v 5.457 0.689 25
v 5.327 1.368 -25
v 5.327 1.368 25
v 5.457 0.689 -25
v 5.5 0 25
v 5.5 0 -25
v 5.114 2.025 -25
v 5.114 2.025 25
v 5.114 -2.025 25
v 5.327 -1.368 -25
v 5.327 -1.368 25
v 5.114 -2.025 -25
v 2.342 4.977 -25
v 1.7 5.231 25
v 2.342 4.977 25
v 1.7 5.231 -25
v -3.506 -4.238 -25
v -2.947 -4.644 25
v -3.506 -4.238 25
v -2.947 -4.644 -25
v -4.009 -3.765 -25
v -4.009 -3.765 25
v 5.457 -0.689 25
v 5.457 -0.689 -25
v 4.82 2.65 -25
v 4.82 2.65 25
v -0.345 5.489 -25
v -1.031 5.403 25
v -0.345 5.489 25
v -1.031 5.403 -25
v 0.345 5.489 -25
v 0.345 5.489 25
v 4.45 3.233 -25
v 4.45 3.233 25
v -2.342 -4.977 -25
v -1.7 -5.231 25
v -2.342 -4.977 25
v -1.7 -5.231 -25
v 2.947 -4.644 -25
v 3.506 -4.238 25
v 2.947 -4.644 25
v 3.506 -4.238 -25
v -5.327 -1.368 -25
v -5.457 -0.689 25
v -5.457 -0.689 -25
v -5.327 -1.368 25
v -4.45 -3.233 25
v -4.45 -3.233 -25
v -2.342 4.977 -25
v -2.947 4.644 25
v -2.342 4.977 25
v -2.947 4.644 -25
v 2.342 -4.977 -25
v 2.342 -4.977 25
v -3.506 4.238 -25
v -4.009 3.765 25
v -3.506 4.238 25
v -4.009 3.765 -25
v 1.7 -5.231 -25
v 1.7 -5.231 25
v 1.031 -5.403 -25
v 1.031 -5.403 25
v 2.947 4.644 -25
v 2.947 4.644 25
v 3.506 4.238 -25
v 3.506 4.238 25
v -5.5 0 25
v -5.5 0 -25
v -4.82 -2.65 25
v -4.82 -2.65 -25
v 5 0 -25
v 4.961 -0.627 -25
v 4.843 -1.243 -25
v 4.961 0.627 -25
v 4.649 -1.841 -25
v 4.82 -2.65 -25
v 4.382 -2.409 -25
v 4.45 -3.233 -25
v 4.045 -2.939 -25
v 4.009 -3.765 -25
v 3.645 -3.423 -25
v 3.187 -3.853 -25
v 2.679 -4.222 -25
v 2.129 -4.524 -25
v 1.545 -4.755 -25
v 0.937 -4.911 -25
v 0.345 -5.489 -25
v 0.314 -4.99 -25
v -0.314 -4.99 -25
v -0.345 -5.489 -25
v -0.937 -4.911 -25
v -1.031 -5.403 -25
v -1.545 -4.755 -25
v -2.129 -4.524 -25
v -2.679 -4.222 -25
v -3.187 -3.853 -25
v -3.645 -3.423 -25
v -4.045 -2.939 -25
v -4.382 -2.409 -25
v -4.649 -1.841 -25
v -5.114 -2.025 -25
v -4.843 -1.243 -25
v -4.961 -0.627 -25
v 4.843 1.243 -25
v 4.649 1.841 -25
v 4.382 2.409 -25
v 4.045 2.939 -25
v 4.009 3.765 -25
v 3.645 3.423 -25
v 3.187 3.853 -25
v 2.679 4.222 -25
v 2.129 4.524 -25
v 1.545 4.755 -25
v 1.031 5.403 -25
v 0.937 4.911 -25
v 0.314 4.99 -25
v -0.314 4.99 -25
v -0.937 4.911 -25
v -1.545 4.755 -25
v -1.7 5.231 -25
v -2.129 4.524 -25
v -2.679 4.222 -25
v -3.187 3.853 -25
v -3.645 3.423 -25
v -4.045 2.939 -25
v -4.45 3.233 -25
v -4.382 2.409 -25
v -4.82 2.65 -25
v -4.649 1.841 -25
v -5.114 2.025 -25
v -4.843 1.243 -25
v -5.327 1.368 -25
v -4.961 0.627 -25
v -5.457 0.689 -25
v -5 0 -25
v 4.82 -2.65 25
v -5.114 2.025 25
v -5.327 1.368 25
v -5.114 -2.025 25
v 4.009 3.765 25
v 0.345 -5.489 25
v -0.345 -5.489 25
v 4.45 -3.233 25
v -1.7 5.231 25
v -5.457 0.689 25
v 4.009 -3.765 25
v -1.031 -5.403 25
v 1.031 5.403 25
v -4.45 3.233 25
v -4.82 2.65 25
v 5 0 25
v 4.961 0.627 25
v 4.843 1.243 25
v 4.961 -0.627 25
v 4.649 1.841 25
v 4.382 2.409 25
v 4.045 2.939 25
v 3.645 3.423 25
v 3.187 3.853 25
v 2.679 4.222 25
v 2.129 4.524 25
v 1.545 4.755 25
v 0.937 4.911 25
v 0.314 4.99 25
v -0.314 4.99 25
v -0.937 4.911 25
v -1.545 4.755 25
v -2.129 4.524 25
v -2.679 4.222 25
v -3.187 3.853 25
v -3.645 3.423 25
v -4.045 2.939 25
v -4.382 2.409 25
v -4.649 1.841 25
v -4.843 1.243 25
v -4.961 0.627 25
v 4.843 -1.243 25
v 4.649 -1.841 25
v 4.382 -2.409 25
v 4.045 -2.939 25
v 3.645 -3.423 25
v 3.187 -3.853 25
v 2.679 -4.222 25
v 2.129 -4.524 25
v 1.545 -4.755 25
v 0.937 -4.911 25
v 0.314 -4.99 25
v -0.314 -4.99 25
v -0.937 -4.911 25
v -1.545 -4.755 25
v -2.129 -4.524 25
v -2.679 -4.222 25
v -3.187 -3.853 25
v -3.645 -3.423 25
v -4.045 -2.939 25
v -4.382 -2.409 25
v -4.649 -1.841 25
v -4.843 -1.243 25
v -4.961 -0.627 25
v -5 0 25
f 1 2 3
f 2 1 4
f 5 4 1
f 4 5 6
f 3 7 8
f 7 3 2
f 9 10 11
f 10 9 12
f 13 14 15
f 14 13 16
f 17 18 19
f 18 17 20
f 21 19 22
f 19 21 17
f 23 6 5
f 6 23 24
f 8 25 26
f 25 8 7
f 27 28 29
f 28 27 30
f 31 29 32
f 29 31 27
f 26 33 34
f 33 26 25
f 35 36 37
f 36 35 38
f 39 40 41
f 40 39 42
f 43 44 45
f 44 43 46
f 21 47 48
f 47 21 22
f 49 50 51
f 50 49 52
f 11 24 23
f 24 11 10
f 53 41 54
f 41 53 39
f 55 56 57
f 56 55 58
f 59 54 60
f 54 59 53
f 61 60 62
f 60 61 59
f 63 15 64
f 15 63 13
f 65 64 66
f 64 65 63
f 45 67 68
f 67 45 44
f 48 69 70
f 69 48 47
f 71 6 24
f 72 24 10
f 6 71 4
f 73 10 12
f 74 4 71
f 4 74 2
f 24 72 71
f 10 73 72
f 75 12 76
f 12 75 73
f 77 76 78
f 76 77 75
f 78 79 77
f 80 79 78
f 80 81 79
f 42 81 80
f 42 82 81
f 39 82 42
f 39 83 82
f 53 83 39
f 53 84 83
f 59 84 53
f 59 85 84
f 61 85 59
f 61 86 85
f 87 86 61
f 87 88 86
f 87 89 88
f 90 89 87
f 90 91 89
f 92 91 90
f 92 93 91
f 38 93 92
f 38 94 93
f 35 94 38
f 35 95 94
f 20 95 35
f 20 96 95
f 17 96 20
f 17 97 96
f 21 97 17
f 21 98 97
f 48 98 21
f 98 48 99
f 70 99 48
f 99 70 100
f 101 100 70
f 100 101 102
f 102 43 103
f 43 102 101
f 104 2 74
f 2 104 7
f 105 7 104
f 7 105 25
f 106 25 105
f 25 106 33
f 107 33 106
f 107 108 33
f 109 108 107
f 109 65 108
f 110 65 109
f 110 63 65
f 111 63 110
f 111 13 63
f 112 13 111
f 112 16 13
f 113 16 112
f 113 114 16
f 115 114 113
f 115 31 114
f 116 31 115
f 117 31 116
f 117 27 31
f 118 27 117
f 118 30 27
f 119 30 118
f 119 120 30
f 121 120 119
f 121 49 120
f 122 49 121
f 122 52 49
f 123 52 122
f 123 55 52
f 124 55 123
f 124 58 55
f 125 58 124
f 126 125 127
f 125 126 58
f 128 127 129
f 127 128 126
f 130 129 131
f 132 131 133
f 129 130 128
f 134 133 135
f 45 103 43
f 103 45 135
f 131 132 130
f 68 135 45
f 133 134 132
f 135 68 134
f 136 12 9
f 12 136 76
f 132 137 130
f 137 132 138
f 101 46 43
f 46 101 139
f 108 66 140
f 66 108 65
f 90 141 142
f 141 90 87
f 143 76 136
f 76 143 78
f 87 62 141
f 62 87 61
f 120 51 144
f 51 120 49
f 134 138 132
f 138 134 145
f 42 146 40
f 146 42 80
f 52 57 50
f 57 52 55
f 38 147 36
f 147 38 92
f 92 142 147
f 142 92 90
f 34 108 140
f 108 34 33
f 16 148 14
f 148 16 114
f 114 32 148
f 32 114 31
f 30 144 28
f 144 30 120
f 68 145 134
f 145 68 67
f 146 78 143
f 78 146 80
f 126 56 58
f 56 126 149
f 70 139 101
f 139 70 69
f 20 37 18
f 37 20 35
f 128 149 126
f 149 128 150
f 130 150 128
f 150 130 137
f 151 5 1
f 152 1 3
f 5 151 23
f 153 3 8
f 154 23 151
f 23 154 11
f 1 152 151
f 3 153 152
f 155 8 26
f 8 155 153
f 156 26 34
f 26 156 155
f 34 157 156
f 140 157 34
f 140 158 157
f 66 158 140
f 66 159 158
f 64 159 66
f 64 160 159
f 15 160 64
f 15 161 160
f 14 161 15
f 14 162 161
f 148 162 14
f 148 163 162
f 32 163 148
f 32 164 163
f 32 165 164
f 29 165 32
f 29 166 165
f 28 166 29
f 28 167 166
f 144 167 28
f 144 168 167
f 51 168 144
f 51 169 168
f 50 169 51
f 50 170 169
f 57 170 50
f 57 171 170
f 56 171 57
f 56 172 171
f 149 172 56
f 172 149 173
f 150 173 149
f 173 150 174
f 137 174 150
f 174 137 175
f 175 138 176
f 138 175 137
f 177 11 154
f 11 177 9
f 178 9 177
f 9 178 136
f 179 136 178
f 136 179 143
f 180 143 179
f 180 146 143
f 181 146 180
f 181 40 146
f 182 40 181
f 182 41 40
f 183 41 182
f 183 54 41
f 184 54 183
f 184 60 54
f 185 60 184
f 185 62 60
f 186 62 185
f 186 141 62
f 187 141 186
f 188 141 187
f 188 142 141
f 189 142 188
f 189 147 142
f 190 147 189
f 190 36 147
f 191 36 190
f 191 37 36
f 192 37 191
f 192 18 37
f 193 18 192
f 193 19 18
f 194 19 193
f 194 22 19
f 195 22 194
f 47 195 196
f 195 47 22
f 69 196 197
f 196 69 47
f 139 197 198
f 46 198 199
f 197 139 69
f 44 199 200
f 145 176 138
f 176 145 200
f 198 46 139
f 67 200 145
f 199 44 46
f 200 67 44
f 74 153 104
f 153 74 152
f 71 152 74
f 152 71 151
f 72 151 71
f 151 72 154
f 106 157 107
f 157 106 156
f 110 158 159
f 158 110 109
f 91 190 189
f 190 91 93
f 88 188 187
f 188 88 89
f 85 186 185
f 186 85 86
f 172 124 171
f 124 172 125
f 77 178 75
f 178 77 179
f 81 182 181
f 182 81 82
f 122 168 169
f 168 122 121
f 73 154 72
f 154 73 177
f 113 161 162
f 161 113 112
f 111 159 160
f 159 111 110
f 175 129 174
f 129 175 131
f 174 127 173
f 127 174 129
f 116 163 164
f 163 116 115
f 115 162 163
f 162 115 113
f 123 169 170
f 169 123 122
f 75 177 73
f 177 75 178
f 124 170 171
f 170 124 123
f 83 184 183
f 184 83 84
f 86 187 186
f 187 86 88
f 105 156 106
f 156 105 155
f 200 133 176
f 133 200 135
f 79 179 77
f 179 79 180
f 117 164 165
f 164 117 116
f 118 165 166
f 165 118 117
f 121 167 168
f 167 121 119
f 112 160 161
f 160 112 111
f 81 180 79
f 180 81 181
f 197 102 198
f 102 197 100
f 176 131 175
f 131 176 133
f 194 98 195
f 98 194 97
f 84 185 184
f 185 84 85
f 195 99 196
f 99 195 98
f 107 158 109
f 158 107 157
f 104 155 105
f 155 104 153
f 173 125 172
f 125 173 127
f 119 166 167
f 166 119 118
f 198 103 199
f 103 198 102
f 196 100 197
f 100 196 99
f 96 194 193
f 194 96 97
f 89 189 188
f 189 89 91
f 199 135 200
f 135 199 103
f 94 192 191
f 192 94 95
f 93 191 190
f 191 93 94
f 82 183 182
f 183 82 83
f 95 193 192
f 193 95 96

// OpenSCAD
$fn = 50;


difference() {
	union() {
		translate(v = [0, 0, -25.0000000000]) {
			cylinder(h = 50, r = 5.5000000000);
		}
	}
	union() {
		translate(v = [0, 0, -100.0000000000]) {
			cylinder(h = 200, r = 5.0000000000);
		}
	}
}
